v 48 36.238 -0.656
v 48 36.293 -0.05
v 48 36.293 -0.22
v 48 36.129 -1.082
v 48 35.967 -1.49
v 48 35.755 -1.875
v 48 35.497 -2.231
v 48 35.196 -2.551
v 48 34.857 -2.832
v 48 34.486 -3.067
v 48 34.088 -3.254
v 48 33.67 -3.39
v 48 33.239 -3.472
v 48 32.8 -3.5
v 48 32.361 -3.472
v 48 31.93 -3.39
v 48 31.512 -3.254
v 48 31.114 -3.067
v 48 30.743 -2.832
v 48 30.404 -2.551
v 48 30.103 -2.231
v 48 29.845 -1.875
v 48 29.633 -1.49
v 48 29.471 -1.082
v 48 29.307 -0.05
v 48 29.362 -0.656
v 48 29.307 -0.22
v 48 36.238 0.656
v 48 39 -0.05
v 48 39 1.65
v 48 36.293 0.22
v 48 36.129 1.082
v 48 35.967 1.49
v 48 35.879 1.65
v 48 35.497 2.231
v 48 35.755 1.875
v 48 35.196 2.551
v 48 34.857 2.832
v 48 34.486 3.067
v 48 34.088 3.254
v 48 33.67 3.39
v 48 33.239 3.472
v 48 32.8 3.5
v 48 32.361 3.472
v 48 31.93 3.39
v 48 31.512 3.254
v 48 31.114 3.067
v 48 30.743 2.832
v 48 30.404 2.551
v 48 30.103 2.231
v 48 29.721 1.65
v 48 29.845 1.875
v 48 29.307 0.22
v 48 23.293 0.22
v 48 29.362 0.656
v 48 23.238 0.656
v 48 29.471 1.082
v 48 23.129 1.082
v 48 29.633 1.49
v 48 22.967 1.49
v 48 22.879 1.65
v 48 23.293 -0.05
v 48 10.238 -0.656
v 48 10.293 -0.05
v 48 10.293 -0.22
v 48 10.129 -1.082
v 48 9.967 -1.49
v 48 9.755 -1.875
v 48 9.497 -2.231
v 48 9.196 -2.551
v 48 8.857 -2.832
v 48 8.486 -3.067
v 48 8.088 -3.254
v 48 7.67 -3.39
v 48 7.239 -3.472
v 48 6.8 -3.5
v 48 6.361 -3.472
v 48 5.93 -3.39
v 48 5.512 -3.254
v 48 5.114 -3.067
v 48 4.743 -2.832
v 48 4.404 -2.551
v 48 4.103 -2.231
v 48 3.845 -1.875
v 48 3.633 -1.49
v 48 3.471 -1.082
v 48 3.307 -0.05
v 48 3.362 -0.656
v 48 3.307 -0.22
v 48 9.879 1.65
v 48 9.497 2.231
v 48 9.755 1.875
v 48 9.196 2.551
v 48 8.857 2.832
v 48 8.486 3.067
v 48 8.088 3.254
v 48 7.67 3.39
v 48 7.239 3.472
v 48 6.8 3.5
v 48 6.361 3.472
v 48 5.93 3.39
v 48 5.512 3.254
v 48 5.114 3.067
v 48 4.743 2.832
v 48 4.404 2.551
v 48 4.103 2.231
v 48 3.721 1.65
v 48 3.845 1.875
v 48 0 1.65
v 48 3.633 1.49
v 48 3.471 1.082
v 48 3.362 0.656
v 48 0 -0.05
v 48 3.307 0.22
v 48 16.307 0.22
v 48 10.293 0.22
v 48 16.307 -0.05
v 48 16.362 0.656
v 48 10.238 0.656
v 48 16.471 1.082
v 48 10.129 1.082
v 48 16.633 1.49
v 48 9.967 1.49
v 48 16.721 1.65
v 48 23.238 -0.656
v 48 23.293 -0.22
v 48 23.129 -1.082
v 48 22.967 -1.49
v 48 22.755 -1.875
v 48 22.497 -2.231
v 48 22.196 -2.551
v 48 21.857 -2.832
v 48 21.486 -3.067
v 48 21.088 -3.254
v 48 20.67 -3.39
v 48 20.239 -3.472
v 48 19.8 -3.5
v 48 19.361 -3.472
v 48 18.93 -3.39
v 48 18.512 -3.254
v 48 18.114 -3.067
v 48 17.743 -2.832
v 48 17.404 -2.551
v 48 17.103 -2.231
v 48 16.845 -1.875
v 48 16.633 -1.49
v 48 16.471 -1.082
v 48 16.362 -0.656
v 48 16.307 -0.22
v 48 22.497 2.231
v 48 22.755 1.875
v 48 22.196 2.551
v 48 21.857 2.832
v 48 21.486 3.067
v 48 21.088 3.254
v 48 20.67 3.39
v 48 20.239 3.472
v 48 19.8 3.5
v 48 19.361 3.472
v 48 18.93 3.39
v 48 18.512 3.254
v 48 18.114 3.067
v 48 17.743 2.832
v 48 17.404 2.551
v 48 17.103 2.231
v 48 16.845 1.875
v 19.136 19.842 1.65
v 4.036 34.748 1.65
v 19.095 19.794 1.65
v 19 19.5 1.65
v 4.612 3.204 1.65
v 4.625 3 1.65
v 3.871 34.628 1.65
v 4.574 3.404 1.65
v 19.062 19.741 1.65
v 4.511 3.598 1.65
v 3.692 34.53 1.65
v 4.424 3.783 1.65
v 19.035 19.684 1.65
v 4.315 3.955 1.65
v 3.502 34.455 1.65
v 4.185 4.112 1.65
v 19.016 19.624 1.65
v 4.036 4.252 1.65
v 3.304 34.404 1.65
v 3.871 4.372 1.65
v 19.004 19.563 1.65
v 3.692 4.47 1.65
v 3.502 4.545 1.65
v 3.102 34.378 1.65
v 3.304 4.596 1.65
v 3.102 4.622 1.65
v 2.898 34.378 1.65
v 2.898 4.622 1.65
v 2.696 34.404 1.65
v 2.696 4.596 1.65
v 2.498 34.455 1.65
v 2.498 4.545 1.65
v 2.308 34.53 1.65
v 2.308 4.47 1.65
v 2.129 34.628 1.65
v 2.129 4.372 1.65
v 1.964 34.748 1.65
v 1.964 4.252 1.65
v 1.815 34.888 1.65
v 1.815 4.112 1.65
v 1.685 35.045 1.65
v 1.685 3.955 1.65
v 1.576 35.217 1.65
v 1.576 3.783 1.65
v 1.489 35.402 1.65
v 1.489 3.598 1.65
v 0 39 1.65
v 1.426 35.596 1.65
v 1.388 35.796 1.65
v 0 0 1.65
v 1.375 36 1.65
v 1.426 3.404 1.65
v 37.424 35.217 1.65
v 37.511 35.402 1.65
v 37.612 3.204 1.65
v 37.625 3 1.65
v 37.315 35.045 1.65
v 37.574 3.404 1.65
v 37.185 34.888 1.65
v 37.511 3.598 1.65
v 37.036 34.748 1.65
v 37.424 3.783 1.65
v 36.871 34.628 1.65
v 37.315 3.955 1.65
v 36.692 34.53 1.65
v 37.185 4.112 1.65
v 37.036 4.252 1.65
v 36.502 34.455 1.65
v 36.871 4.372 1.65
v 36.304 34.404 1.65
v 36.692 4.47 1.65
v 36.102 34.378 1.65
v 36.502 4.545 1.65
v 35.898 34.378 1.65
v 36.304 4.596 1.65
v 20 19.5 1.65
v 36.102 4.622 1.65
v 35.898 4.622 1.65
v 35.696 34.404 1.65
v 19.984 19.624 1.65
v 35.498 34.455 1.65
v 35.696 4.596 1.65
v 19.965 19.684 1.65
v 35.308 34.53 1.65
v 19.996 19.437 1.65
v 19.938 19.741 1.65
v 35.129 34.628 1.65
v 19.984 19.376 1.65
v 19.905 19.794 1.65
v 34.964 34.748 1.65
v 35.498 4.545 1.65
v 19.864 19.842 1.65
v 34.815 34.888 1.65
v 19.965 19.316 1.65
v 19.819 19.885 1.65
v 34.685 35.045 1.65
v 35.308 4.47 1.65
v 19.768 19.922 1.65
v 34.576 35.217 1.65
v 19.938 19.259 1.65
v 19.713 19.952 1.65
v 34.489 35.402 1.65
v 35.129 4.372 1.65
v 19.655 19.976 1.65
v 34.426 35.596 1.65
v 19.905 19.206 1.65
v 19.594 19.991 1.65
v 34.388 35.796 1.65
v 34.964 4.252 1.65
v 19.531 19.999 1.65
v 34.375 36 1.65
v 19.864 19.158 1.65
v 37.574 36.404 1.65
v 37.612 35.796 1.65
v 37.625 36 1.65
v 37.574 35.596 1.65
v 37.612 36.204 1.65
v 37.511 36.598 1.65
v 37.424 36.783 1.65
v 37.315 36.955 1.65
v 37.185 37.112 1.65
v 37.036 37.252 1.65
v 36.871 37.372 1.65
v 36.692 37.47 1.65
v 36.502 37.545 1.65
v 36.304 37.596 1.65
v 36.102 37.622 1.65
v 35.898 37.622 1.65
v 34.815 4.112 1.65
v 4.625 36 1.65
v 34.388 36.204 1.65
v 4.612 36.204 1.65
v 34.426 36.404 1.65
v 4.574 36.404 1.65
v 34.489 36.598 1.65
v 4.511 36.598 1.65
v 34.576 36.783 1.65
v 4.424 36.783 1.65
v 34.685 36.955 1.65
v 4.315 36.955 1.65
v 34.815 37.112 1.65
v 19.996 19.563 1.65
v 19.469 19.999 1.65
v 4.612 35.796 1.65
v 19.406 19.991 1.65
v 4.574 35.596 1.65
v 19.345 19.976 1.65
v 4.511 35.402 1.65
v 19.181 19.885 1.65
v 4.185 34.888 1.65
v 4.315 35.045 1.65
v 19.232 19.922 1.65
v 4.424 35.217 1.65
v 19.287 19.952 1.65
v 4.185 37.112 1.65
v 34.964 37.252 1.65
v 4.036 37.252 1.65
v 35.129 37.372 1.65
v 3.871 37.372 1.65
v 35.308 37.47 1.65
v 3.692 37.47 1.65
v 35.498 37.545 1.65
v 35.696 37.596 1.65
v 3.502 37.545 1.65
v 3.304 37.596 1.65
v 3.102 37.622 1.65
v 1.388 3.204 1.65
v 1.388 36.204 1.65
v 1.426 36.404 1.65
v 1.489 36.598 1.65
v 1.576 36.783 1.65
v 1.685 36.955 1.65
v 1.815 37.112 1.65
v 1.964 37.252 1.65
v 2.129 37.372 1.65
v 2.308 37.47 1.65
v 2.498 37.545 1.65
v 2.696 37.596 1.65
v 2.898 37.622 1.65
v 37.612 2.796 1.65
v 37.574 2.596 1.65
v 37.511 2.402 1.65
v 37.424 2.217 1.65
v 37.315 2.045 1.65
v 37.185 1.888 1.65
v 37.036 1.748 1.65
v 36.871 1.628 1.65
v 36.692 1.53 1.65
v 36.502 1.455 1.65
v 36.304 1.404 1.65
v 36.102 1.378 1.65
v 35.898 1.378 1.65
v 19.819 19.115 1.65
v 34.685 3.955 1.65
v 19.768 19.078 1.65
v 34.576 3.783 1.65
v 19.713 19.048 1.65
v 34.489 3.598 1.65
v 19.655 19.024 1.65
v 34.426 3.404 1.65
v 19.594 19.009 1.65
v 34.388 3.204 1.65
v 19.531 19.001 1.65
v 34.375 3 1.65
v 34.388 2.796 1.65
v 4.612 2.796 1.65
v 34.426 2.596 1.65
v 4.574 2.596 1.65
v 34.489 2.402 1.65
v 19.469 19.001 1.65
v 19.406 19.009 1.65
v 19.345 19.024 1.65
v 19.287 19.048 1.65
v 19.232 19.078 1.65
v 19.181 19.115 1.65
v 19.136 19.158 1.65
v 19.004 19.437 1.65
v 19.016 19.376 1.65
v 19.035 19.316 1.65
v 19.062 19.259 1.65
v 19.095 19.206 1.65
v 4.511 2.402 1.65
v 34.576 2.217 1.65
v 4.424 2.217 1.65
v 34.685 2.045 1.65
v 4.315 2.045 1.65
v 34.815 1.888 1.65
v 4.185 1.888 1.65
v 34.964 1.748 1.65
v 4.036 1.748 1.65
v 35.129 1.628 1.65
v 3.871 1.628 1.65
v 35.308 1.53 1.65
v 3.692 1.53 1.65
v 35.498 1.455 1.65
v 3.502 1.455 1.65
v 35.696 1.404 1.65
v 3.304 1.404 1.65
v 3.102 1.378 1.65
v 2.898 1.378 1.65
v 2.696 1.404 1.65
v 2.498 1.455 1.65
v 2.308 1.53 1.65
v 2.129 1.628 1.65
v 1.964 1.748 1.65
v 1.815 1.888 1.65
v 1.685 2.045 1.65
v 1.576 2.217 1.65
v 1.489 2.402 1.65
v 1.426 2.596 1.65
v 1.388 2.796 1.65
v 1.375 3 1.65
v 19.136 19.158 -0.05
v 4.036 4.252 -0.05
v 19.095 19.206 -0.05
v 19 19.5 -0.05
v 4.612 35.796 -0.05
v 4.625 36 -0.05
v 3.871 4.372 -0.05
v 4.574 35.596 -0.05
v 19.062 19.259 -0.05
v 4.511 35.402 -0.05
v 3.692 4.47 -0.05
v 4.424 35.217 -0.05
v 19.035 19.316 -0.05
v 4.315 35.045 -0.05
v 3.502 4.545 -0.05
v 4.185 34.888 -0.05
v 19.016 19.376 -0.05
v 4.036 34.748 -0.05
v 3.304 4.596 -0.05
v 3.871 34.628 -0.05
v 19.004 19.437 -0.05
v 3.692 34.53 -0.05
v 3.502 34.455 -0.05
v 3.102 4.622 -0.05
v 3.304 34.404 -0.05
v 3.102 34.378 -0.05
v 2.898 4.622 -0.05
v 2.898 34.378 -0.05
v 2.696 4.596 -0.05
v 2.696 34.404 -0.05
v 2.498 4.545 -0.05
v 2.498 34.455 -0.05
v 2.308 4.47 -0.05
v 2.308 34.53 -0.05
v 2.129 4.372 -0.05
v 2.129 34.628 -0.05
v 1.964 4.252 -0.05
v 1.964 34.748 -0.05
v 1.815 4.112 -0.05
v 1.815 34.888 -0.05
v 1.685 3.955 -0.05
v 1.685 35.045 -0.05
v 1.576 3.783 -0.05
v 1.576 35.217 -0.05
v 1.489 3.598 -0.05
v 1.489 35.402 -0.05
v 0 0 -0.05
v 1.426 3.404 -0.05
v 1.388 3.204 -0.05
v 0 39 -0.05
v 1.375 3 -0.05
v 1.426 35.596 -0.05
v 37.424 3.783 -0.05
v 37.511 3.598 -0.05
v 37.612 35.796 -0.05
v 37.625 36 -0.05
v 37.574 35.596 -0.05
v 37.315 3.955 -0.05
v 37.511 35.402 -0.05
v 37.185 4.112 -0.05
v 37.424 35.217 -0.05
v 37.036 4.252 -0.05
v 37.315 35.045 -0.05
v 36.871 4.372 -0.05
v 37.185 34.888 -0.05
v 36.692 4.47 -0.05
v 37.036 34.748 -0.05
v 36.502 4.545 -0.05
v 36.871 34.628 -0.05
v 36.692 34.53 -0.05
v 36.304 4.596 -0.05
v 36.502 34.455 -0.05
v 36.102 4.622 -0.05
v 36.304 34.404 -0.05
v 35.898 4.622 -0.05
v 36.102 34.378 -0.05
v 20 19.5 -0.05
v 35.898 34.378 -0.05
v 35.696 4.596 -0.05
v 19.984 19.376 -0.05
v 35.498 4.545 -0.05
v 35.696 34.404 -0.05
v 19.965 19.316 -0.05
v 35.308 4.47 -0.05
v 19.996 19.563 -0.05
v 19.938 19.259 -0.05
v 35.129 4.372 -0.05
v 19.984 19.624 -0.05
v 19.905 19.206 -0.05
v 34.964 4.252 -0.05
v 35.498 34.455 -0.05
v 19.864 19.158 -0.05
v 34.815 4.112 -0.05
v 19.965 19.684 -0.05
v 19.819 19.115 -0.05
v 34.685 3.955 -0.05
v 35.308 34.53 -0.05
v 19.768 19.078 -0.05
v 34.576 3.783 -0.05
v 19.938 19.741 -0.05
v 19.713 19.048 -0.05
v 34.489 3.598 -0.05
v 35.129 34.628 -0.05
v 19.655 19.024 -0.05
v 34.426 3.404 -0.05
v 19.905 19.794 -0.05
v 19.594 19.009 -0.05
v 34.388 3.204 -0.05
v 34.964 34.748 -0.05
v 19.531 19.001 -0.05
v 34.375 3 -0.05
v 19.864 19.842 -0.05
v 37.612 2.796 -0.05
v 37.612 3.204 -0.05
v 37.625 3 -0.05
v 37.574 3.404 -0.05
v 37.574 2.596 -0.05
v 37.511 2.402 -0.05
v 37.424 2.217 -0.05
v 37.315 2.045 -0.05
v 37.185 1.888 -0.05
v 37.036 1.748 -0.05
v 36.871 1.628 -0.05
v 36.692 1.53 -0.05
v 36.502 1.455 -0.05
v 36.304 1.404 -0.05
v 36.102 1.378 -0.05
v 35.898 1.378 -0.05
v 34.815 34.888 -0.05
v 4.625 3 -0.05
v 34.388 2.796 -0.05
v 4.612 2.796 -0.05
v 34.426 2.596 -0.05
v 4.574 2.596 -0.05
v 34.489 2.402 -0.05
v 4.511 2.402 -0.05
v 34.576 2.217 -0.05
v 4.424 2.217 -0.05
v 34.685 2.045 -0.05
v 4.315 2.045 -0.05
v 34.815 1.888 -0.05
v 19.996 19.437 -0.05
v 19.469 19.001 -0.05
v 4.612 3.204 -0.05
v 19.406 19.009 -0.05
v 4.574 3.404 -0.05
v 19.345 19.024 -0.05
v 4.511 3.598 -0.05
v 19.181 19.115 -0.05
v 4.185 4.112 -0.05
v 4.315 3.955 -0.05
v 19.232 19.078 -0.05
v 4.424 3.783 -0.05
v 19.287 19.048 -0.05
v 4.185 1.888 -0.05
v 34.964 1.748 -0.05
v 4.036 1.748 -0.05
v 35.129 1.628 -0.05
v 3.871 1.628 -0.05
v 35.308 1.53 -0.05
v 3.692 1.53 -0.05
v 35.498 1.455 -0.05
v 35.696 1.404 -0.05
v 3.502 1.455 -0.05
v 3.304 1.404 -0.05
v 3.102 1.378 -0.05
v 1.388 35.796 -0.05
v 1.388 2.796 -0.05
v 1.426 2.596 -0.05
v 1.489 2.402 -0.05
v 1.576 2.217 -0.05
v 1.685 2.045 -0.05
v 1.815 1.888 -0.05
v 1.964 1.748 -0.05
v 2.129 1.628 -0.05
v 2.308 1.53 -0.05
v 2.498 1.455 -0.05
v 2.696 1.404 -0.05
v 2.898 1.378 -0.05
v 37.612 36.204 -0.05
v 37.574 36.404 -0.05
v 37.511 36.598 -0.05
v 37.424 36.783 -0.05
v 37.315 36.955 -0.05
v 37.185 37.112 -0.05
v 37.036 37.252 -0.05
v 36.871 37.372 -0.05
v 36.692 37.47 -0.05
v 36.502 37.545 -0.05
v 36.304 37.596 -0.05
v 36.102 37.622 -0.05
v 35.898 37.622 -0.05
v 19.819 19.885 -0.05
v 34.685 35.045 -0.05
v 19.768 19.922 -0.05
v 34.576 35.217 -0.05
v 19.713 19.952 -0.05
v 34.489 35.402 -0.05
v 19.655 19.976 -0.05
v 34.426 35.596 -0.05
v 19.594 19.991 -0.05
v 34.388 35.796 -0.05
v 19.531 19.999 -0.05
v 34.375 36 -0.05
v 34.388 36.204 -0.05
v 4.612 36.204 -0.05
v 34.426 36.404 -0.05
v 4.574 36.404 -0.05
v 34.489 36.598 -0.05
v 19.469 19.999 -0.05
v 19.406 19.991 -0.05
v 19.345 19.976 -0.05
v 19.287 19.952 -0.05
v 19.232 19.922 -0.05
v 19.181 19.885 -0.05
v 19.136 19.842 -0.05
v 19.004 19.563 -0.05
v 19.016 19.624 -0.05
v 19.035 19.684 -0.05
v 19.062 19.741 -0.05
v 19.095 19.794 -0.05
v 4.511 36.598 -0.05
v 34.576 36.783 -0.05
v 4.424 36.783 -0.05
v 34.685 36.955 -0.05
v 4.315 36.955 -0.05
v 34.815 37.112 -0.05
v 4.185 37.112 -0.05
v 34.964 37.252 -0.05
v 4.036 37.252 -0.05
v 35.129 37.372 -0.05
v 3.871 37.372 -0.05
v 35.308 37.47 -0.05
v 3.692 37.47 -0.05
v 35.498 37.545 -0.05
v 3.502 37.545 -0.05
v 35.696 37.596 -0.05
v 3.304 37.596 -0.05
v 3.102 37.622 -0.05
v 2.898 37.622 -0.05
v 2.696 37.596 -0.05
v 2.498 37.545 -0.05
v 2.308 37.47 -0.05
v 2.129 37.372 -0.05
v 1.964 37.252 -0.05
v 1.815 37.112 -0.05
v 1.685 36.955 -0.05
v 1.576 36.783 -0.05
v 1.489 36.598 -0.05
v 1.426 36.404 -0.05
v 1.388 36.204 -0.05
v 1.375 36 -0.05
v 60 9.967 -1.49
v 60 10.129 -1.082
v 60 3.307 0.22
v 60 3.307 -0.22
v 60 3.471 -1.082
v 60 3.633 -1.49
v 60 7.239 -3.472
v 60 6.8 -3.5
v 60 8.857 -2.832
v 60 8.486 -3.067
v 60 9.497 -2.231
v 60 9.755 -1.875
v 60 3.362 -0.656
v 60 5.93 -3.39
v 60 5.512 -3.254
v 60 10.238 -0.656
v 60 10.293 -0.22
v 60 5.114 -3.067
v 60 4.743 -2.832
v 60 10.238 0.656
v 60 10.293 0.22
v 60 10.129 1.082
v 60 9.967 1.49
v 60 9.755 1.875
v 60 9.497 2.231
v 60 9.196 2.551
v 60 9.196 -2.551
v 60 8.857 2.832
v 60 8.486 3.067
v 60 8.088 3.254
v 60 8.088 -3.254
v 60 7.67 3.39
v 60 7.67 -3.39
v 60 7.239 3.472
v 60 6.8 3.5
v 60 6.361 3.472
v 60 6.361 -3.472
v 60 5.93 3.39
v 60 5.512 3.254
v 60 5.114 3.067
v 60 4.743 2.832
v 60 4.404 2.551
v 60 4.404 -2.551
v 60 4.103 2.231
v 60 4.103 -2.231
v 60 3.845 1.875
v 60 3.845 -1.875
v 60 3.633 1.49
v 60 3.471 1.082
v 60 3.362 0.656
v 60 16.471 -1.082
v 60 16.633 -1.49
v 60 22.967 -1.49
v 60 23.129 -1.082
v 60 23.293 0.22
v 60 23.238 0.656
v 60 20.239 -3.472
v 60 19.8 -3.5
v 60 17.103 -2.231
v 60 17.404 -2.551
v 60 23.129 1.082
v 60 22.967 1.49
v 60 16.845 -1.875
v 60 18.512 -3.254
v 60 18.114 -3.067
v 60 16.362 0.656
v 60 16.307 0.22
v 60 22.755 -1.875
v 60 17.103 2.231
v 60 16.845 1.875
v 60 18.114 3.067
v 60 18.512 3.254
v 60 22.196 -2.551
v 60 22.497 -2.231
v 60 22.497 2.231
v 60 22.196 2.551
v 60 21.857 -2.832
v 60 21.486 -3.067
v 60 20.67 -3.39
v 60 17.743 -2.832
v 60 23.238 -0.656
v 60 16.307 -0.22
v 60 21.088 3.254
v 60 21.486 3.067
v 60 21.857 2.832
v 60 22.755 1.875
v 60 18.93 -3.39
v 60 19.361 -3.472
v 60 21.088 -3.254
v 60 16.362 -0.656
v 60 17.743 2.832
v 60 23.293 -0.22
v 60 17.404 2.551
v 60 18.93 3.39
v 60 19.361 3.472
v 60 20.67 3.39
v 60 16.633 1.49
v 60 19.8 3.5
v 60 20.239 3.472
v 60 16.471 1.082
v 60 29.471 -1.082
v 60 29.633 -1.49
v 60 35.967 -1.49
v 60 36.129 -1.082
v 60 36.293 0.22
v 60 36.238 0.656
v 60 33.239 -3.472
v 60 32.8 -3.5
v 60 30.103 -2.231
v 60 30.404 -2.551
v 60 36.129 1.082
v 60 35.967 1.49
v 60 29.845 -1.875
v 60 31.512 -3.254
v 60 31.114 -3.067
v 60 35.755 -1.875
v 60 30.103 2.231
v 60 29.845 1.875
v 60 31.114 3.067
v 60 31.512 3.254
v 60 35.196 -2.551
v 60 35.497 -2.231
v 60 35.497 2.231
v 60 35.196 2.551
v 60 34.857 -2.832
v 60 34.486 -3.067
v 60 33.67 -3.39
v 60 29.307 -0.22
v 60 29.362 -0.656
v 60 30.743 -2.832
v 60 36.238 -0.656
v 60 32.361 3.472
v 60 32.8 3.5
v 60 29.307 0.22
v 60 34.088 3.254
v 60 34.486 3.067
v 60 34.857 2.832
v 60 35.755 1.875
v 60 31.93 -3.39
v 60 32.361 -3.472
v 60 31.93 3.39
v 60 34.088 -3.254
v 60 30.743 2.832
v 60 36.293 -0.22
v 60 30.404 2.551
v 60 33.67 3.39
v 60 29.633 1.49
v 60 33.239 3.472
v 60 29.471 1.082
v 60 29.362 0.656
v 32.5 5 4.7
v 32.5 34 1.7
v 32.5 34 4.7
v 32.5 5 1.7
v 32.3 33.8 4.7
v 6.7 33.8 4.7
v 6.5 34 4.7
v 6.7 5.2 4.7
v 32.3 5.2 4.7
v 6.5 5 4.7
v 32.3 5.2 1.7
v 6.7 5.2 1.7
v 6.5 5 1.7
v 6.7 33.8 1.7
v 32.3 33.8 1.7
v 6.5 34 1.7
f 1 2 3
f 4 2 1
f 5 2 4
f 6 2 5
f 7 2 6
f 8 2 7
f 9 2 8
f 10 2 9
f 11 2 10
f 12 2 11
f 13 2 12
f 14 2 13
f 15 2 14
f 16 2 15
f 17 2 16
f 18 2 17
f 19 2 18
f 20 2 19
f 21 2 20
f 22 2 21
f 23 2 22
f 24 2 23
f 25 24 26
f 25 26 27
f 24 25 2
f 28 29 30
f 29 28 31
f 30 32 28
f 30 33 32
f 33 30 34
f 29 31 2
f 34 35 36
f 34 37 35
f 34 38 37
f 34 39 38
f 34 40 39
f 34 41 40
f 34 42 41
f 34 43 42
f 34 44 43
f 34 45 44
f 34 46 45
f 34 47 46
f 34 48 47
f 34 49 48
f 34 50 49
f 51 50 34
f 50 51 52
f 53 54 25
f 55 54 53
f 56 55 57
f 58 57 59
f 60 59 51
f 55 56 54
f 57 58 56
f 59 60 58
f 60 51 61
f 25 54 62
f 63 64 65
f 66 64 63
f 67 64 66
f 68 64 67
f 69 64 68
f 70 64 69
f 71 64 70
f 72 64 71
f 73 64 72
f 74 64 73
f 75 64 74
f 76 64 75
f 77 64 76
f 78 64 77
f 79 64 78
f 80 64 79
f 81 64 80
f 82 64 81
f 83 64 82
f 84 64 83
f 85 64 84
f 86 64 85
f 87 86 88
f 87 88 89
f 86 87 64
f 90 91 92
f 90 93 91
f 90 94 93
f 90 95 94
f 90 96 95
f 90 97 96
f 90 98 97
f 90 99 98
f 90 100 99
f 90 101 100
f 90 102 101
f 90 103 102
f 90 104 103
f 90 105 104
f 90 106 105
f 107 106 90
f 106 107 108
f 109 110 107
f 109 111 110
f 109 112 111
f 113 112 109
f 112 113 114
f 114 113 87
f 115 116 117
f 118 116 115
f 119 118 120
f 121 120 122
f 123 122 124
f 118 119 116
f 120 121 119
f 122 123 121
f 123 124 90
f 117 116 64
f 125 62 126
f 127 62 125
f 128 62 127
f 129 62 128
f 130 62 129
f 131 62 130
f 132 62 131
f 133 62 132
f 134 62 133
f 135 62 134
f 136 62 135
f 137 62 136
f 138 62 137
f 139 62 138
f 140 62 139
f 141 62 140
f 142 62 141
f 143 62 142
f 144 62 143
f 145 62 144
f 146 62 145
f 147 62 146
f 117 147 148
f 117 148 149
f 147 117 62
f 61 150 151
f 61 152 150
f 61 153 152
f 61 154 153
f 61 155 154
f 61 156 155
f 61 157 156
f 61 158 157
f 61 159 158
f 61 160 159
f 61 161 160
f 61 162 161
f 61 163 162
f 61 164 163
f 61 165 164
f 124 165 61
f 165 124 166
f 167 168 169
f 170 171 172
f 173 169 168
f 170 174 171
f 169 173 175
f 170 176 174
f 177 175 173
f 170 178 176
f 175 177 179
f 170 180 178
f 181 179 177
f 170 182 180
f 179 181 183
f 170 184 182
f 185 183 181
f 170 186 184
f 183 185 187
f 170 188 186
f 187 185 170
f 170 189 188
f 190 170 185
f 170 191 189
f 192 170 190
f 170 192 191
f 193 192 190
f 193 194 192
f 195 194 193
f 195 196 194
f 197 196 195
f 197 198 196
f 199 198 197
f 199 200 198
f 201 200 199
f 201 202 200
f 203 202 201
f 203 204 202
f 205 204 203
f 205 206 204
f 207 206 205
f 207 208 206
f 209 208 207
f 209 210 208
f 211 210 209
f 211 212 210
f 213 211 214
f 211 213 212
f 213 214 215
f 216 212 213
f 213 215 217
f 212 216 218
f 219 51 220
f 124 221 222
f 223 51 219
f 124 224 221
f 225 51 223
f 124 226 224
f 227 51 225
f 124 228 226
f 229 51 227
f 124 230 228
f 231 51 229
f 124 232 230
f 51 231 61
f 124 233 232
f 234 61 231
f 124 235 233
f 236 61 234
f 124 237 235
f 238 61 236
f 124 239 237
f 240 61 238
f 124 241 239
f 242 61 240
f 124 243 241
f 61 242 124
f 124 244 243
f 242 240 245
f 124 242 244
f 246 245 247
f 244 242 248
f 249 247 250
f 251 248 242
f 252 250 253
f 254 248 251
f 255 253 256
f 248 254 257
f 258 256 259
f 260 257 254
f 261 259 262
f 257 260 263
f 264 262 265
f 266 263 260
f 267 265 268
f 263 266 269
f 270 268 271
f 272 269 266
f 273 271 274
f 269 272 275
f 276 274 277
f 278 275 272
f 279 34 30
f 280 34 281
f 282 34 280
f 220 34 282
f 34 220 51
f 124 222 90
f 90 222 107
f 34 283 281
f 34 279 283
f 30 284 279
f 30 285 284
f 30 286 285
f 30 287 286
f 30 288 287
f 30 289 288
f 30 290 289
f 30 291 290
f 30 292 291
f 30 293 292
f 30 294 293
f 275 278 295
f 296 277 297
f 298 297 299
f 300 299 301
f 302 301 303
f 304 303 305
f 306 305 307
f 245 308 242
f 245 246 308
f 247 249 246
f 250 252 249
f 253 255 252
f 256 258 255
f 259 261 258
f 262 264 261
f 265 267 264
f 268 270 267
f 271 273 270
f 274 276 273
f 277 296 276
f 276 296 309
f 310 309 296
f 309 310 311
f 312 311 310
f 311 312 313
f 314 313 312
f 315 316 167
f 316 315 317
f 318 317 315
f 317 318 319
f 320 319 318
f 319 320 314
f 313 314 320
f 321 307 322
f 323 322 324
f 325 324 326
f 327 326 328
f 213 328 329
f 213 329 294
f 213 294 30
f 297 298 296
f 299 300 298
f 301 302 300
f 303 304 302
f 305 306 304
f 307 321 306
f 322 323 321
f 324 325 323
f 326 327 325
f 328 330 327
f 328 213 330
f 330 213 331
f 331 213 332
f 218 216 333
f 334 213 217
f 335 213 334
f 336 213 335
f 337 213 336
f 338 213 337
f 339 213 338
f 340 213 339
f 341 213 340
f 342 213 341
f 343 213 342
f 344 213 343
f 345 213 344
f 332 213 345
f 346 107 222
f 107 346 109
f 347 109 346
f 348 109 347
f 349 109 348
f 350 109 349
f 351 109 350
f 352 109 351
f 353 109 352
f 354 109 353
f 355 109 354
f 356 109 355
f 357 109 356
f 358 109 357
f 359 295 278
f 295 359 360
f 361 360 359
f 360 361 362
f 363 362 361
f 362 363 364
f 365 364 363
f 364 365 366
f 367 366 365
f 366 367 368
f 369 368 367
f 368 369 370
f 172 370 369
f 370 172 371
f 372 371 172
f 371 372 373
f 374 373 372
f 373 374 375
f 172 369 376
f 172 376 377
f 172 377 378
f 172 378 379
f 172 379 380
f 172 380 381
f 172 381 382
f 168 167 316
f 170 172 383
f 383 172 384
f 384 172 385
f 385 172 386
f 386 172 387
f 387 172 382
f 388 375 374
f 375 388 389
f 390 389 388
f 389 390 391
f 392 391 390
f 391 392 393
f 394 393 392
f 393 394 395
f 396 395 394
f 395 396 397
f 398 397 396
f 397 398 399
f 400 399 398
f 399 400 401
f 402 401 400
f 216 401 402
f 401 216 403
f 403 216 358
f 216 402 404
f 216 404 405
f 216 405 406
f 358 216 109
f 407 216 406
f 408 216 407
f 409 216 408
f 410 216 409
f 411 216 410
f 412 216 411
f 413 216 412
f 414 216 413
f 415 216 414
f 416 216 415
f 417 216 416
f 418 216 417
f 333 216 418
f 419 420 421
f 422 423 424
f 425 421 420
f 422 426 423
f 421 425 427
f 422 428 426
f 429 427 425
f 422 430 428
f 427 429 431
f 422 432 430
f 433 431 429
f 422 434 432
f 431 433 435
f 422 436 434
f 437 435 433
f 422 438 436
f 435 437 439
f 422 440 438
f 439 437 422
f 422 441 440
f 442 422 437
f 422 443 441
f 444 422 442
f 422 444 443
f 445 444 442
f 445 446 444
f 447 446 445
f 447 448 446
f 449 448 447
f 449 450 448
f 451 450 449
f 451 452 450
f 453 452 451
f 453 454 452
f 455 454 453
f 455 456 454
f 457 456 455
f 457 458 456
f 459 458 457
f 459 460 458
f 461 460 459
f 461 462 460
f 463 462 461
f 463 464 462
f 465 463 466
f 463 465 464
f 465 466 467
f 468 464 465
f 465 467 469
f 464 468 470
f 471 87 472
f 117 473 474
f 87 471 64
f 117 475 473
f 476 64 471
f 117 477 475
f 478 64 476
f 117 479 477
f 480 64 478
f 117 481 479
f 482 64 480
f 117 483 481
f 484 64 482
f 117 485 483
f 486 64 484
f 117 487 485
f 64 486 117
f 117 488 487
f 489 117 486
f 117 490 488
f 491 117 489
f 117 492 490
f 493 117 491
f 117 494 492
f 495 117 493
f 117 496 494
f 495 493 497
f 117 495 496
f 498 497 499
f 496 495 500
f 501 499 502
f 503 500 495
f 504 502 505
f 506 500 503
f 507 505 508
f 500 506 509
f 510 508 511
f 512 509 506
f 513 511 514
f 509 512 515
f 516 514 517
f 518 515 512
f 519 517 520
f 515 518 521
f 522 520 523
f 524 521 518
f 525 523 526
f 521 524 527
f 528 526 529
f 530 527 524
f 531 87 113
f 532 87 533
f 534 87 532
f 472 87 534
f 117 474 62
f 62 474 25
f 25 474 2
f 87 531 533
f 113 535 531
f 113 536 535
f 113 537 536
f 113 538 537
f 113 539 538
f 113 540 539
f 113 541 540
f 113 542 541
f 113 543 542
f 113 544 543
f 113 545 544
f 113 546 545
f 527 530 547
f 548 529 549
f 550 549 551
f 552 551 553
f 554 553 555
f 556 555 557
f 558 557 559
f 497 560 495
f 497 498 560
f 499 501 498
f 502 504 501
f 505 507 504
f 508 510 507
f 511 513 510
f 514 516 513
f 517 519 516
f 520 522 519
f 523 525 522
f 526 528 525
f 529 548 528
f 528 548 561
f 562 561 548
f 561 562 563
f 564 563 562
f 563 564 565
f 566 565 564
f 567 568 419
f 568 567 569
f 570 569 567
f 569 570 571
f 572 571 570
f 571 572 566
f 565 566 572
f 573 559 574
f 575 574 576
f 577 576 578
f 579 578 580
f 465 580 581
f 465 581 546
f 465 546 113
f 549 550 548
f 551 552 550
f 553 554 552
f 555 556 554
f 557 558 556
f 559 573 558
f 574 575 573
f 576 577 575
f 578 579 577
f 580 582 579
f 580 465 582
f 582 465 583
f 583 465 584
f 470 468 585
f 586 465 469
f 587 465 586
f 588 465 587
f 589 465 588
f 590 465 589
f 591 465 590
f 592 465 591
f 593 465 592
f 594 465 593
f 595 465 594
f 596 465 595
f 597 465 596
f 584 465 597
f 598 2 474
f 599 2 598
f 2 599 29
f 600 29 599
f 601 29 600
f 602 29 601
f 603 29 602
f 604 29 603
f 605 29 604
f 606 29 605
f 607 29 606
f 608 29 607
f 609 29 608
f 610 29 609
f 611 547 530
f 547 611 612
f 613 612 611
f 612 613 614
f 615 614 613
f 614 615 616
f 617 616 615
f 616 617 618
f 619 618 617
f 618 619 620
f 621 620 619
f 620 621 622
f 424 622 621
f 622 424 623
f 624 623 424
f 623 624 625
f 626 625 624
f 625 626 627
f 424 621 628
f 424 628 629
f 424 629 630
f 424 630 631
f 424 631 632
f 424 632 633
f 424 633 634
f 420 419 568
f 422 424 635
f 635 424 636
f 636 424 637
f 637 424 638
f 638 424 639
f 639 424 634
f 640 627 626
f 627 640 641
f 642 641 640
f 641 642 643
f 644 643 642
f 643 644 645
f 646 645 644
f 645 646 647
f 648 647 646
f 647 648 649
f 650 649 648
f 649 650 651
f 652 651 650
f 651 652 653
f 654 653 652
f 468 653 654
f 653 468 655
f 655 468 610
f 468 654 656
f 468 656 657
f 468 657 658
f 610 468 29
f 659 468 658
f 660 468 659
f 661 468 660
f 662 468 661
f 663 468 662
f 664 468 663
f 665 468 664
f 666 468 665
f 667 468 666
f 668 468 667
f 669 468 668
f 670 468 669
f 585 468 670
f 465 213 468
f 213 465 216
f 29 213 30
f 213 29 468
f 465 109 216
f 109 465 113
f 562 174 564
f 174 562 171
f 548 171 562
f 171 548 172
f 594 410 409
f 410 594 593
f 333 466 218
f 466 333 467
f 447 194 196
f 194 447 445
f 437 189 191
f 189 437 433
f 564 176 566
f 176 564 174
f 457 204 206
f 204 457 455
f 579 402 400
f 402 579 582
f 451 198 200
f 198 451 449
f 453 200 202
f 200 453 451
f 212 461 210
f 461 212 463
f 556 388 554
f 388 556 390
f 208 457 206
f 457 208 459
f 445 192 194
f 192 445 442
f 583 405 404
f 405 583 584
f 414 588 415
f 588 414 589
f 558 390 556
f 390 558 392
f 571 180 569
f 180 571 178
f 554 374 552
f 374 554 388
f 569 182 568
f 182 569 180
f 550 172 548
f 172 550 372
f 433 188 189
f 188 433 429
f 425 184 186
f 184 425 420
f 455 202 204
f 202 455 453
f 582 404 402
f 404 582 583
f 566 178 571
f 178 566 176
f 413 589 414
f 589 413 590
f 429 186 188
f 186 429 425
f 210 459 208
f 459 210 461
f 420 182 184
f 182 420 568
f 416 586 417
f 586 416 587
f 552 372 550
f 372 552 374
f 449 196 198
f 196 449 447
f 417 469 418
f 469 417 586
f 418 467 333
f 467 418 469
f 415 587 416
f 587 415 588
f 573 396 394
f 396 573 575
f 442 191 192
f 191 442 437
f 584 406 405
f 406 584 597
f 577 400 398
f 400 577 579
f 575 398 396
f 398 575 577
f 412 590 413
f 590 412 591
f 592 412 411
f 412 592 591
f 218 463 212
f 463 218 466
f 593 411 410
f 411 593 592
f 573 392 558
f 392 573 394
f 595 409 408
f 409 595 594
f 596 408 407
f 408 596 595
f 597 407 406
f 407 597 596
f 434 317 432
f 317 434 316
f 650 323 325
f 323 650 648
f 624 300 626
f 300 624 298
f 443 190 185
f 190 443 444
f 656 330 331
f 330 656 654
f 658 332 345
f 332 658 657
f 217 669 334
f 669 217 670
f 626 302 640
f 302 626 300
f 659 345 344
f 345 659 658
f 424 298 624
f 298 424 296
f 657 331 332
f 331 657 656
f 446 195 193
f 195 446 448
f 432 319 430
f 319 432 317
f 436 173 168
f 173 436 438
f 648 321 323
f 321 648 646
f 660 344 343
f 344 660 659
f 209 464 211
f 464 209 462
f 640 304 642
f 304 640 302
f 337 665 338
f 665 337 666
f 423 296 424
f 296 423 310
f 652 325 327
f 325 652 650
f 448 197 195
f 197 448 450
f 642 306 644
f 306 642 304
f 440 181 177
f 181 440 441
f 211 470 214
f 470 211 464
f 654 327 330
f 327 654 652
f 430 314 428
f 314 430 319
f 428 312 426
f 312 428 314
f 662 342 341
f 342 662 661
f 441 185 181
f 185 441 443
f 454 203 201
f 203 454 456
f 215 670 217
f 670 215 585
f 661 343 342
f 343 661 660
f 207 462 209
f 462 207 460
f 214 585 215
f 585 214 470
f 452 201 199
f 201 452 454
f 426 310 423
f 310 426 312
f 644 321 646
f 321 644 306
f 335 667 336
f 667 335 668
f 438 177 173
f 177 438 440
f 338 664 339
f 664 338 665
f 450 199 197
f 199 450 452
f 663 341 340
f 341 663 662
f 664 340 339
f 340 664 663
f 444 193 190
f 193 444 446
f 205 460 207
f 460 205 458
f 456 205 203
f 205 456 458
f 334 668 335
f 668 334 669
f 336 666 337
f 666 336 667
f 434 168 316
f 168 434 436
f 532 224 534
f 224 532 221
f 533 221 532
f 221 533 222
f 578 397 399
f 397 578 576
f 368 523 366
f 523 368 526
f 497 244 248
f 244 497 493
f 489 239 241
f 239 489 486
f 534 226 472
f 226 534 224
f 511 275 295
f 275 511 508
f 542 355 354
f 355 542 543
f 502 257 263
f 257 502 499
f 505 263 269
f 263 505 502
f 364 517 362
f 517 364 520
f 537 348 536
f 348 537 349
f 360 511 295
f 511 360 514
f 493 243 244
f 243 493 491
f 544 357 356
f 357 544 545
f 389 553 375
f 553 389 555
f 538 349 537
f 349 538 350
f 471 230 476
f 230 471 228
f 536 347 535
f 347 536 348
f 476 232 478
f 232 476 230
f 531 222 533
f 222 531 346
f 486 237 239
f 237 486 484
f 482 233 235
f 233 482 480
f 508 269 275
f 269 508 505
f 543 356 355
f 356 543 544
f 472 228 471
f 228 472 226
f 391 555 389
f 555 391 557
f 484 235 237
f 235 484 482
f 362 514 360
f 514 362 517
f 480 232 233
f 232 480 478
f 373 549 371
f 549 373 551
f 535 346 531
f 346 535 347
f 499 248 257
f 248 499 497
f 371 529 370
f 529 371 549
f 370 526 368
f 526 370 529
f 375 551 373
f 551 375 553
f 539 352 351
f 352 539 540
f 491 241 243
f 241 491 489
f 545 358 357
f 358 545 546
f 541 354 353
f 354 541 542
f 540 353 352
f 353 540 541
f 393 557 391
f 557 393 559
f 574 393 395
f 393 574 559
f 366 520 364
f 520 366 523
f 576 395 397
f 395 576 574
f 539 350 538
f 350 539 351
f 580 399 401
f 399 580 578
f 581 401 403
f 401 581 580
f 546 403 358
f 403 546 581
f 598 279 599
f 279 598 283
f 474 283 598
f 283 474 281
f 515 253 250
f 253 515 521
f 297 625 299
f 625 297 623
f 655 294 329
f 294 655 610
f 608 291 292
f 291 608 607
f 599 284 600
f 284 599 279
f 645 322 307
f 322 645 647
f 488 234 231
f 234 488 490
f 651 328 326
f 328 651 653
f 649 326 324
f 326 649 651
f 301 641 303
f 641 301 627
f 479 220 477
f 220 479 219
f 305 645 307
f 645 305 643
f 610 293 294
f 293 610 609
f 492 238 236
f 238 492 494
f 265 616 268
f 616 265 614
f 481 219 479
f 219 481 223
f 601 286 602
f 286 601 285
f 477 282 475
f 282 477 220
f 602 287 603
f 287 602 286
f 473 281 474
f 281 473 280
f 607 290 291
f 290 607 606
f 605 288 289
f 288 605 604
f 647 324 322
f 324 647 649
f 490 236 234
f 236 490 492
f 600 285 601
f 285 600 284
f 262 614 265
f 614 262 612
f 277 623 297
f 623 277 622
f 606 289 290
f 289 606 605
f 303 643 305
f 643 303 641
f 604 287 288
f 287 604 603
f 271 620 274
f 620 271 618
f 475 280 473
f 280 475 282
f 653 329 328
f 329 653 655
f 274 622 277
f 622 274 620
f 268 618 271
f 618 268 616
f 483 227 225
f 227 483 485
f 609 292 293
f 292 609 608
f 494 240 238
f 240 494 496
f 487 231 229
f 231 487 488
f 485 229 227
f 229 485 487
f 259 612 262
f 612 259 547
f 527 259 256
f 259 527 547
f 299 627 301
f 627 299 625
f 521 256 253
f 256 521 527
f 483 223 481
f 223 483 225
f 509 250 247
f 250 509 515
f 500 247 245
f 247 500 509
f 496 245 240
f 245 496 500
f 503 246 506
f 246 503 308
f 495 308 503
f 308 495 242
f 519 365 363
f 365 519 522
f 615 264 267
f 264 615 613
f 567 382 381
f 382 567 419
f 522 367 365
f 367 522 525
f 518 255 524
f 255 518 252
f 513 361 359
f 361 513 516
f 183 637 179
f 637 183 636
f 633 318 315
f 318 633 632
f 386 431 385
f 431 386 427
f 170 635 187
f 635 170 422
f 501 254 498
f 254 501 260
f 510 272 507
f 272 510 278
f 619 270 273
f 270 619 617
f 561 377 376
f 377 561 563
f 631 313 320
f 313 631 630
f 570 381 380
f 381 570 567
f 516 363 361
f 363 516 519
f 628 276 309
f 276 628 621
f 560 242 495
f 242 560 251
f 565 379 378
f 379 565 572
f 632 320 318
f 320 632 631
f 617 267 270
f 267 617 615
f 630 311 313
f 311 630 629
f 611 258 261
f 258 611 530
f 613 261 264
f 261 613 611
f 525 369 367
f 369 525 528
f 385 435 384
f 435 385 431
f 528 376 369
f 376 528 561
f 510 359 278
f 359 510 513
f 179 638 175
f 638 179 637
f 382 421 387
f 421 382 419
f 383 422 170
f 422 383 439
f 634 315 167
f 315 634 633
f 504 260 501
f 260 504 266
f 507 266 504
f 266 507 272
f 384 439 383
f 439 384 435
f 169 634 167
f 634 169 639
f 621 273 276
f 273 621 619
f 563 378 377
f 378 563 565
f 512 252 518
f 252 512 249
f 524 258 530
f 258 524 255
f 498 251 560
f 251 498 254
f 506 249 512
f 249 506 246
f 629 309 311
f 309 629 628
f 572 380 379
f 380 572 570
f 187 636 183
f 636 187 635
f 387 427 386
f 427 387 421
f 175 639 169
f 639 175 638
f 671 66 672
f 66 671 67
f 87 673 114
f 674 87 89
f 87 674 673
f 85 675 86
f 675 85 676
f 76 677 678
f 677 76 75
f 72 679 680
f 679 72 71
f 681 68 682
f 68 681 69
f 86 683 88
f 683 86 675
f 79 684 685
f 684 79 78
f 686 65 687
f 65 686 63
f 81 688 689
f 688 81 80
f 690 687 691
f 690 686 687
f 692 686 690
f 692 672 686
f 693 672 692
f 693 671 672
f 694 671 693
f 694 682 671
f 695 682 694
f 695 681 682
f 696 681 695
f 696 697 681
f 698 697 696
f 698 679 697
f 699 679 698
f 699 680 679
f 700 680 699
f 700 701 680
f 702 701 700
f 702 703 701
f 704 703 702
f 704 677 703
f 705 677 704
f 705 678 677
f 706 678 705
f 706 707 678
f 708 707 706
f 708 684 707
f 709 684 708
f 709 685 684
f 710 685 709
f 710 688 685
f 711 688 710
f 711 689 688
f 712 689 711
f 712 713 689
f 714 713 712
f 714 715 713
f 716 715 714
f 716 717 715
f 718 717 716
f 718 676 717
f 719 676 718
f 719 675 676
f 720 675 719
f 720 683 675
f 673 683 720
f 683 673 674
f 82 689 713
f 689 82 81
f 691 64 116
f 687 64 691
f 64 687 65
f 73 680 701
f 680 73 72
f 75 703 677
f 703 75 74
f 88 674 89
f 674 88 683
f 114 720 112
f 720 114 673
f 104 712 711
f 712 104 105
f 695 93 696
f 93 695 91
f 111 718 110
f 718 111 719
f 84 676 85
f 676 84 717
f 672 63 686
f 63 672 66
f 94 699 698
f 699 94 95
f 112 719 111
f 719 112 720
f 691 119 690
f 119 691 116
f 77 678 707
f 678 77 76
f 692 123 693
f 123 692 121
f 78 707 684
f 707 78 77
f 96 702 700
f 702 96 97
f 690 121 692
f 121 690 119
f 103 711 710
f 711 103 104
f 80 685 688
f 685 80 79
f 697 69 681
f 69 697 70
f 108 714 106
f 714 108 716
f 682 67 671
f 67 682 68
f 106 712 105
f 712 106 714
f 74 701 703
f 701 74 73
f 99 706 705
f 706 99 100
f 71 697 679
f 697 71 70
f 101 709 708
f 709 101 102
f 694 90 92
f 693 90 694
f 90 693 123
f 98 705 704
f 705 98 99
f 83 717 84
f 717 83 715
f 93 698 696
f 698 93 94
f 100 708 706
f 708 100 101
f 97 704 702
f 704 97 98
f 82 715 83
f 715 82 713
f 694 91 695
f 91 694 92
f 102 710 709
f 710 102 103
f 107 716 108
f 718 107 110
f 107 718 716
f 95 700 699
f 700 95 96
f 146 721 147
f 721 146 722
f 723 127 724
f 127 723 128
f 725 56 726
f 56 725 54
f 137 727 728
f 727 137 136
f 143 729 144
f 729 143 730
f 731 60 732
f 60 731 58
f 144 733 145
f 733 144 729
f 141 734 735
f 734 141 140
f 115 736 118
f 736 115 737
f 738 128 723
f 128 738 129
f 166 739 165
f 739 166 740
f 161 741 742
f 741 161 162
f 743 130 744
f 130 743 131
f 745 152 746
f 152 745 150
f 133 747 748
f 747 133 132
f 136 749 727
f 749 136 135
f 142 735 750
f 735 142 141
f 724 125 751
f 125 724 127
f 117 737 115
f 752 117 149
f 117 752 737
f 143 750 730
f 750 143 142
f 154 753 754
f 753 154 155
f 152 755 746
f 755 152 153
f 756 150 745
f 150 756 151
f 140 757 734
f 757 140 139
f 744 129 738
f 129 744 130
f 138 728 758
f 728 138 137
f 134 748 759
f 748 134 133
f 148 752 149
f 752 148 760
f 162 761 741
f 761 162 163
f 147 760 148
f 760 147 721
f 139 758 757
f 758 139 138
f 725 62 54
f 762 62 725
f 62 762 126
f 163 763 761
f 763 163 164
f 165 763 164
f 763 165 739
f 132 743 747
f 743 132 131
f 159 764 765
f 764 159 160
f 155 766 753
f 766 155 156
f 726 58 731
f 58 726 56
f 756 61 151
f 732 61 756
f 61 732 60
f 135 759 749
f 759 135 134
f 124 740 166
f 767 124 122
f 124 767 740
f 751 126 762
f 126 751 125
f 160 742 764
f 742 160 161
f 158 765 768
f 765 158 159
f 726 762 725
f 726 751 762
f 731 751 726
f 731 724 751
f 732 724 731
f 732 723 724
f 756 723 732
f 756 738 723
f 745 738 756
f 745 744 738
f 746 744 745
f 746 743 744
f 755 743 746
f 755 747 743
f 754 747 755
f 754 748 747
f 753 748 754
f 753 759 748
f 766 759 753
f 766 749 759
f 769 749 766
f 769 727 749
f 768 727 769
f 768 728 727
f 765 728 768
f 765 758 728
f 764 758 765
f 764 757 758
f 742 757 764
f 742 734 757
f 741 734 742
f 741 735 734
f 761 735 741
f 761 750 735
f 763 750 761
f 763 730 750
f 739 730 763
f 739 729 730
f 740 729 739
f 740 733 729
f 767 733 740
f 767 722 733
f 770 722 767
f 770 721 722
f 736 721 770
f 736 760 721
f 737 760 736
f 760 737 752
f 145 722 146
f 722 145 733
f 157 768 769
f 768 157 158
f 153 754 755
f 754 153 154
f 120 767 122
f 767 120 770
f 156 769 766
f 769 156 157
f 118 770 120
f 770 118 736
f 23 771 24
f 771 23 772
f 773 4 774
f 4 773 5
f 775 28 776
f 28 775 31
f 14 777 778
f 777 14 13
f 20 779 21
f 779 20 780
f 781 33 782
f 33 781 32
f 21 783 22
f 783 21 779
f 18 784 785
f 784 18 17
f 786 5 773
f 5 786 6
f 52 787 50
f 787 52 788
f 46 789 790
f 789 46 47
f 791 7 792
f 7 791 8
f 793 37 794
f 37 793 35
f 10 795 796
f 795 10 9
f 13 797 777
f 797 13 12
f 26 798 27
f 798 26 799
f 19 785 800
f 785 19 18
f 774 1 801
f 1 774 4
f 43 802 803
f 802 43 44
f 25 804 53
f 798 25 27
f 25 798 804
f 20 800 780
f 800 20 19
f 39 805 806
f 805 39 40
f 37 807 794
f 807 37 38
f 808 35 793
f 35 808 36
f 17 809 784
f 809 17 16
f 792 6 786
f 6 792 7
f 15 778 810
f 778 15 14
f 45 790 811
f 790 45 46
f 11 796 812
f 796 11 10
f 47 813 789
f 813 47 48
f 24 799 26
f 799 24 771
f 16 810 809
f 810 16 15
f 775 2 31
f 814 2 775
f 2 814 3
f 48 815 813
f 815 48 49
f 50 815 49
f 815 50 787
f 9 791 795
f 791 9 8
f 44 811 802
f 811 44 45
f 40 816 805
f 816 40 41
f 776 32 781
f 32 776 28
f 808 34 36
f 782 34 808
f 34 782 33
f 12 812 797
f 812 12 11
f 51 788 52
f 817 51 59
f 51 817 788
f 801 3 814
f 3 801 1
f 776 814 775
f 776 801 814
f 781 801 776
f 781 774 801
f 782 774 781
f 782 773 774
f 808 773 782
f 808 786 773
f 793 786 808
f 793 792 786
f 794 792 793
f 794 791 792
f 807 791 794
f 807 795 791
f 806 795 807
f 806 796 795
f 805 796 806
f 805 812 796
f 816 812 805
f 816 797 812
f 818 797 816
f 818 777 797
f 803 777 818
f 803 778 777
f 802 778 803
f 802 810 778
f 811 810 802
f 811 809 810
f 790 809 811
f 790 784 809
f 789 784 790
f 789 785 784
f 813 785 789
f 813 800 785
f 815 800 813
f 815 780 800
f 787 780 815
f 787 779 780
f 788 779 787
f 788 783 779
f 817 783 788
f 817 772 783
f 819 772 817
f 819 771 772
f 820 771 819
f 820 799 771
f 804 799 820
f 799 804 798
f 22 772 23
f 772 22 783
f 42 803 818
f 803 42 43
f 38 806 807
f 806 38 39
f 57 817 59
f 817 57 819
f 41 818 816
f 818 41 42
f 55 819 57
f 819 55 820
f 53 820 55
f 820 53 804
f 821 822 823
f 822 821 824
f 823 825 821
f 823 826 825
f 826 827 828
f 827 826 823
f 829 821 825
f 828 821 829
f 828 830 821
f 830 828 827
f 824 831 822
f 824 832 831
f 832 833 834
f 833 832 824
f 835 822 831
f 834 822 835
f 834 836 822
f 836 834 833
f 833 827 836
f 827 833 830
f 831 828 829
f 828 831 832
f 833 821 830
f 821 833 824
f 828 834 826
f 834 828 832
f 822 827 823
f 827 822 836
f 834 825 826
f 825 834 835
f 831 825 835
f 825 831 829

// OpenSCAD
$fn = 50;

module Enclosure(x, y, z) {
    THICKNESS = .2;
    cube([x,THICKNESS,z]);
    cube([THICKNESS,y,z]);
    translate([0,y-THICKNESS,0]) cube([x,THICKNESS,z]);
    translate([x-THICKNESS,0,0]) cube([THICKNESS,y,z]);
}

module ChubutBoard() {
    translate([0,0,-.05]) color([0,.6,0]) difference() {
        cube([48, 39, 1.7]);
        translate([3,3,-1]) cylinder(d=3.25, h=3*1.7);
        translate([3,39-3,-1]) cylinder(d=3.25, h=3*1.7);
        translate([39-3,3,-1]) cylinder(d=3.25, h=3*1.7);
        translate([39-3,39-3,-1]) cylinder(d=3.25, h=3*1.7);
        translate([39/2,39/2,-1]) cylinder(d=1, h=3*1.7);
    }
    translate([0,6.8,0])
    for (i = [0,1,2]) {
        translate([48,i*26/2,0]) rotate(v=[0,1,0], a=90) cylinder(d=7, h=12);
    }
    color(.7*[1,1,1]) translate([(39-26)/2,(39-29)/2,1.7]) Enclosure(26,29,3);
//    translate([19.5,19.5,0]) rotate(a=90, v=[0,0,1]) import("../external_modules/chubut_board/chubut.stl");
}

ChubutBoard();
